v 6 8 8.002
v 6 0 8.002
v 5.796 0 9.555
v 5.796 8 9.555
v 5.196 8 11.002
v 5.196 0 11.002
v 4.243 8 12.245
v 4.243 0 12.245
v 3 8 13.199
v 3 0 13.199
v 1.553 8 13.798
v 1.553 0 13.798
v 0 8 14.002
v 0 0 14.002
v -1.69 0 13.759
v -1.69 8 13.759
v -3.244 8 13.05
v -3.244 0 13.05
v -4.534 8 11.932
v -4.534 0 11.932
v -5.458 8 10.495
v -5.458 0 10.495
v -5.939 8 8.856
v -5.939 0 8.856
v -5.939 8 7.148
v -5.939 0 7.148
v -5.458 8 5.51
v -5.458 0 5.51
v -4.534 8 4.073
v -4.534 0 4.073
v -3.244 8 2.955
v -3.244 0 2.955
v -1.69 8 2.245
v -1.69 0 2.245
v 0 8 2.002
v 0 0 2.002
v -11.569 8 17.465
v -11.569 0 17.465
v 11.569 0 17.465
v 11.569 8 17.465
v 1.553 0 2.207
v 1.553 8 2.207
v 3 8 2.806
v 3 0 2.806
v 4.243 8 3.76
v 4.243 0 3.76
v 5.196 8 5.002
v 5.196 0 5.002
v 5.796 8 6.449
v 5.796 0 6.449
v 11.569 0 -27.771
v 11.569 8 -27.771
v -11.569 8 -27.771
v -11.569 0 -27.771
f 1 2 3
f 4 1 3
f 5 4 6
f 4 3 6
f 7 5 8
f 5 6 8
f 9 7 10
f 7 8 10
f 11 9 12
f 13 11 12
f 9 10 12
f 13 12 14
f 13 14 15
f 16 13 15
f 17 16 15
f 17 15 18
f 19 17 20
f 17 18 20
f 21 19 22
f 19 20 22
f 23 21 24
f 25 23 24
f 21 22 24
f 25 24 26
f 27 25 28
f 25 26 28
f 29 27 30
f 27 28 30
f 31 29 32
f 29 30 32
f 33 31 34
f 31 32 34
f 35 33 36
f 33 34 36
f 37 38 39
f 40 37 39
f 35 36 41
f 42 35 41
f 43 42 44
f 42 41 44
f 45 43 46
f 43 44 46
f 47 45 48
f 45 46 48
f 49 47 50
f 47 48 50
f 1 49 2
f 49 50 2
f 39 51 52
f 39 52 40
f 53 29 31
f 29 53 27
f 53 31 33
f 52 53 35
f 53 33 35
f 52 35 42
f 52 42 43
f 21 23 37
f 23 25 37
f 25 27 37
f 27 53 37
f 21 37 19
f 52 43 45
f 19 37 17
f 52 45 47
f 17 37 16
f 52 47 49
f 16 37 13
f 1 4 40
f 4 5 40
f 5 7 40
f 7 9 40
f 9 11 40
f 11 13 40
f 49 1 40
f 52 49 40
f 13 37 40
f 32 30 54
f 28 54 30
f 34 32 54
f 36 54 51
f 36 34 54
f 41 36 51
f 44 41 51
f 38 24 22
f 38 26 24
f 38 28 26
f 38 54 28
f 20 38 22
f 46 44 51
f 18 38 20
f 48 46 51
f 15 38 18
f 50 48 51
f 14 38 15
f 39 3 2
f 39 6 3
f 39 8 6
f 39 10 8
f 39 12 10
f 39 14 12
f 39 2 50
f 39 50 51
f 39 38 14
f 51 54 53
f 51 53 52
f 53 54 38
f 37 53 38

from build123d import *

# Parameters (mm, degrees)
BOSS_EXTRUDE1_DEPTH = 8
SKETCH2_W           = 23.137445614
SKETCH2_H           = 10.306738945
BOSS_EXTRUDE2_DEPTH = 8


with BuildPart() as part:
    # Sketch1 → Boss-Extrude1 (new body)
    with BuildSketch(Plane(origin=(0, 0, 0), x_dir=(1, 0, 0), z_dir=(0, 1, 0))):
        with BuildLine():
            Line((11.568722807, -17.464704369), (11.568722807, 17.464704369))
            Line((11.568722807, 17.464704369), (0, 17.464704369))
            Line((0, 17.464704369), (0, -2.002357687))
            ThreePointArc((0, -2.002357687), (4.242640687, -3.759717), (6, -8.002357687))
            ThreePointArc((6, -8.002357687), (4.242640687, -12.244998375), (0, -14.002357687))
            Line((0, -14.002357687), (0, -17.464704369))
            Line((0, -17.464704369), (11.568722807, -17.464704369))
        make_face()
        with BuildLine():
            Line((0, -2.002357687), (0, 17.464704369))
            Line((0, 17.464704369), (-11.568722807, 17.464704369))
            Line((-11.568722807, 17.464704369), (-11.568722807, -17.464704369))
            Line((-11.568722807, -17.464704369), (0, -17.464704369))
            Line((0, -17.464704369), (0, -14.002357687))
            ThreePointArc((0, -14.002357687), (-6, -8.002357687), (0, -2.002357687))
        make_face()
    extrude(amount=BOSS_EXTRUDE1_DEPTH)

    # Sketch2 → Boss-Extrude2 (add)
    with BuildSketch(Plane.XZ):
        with Locations((0, -22.618073841)):
            Rectangle(SKETCH2_W, SKETCH2_H)
    extrude(amount=-BOSS_EXTRUDE2_DEPTH)


solid = part.part
